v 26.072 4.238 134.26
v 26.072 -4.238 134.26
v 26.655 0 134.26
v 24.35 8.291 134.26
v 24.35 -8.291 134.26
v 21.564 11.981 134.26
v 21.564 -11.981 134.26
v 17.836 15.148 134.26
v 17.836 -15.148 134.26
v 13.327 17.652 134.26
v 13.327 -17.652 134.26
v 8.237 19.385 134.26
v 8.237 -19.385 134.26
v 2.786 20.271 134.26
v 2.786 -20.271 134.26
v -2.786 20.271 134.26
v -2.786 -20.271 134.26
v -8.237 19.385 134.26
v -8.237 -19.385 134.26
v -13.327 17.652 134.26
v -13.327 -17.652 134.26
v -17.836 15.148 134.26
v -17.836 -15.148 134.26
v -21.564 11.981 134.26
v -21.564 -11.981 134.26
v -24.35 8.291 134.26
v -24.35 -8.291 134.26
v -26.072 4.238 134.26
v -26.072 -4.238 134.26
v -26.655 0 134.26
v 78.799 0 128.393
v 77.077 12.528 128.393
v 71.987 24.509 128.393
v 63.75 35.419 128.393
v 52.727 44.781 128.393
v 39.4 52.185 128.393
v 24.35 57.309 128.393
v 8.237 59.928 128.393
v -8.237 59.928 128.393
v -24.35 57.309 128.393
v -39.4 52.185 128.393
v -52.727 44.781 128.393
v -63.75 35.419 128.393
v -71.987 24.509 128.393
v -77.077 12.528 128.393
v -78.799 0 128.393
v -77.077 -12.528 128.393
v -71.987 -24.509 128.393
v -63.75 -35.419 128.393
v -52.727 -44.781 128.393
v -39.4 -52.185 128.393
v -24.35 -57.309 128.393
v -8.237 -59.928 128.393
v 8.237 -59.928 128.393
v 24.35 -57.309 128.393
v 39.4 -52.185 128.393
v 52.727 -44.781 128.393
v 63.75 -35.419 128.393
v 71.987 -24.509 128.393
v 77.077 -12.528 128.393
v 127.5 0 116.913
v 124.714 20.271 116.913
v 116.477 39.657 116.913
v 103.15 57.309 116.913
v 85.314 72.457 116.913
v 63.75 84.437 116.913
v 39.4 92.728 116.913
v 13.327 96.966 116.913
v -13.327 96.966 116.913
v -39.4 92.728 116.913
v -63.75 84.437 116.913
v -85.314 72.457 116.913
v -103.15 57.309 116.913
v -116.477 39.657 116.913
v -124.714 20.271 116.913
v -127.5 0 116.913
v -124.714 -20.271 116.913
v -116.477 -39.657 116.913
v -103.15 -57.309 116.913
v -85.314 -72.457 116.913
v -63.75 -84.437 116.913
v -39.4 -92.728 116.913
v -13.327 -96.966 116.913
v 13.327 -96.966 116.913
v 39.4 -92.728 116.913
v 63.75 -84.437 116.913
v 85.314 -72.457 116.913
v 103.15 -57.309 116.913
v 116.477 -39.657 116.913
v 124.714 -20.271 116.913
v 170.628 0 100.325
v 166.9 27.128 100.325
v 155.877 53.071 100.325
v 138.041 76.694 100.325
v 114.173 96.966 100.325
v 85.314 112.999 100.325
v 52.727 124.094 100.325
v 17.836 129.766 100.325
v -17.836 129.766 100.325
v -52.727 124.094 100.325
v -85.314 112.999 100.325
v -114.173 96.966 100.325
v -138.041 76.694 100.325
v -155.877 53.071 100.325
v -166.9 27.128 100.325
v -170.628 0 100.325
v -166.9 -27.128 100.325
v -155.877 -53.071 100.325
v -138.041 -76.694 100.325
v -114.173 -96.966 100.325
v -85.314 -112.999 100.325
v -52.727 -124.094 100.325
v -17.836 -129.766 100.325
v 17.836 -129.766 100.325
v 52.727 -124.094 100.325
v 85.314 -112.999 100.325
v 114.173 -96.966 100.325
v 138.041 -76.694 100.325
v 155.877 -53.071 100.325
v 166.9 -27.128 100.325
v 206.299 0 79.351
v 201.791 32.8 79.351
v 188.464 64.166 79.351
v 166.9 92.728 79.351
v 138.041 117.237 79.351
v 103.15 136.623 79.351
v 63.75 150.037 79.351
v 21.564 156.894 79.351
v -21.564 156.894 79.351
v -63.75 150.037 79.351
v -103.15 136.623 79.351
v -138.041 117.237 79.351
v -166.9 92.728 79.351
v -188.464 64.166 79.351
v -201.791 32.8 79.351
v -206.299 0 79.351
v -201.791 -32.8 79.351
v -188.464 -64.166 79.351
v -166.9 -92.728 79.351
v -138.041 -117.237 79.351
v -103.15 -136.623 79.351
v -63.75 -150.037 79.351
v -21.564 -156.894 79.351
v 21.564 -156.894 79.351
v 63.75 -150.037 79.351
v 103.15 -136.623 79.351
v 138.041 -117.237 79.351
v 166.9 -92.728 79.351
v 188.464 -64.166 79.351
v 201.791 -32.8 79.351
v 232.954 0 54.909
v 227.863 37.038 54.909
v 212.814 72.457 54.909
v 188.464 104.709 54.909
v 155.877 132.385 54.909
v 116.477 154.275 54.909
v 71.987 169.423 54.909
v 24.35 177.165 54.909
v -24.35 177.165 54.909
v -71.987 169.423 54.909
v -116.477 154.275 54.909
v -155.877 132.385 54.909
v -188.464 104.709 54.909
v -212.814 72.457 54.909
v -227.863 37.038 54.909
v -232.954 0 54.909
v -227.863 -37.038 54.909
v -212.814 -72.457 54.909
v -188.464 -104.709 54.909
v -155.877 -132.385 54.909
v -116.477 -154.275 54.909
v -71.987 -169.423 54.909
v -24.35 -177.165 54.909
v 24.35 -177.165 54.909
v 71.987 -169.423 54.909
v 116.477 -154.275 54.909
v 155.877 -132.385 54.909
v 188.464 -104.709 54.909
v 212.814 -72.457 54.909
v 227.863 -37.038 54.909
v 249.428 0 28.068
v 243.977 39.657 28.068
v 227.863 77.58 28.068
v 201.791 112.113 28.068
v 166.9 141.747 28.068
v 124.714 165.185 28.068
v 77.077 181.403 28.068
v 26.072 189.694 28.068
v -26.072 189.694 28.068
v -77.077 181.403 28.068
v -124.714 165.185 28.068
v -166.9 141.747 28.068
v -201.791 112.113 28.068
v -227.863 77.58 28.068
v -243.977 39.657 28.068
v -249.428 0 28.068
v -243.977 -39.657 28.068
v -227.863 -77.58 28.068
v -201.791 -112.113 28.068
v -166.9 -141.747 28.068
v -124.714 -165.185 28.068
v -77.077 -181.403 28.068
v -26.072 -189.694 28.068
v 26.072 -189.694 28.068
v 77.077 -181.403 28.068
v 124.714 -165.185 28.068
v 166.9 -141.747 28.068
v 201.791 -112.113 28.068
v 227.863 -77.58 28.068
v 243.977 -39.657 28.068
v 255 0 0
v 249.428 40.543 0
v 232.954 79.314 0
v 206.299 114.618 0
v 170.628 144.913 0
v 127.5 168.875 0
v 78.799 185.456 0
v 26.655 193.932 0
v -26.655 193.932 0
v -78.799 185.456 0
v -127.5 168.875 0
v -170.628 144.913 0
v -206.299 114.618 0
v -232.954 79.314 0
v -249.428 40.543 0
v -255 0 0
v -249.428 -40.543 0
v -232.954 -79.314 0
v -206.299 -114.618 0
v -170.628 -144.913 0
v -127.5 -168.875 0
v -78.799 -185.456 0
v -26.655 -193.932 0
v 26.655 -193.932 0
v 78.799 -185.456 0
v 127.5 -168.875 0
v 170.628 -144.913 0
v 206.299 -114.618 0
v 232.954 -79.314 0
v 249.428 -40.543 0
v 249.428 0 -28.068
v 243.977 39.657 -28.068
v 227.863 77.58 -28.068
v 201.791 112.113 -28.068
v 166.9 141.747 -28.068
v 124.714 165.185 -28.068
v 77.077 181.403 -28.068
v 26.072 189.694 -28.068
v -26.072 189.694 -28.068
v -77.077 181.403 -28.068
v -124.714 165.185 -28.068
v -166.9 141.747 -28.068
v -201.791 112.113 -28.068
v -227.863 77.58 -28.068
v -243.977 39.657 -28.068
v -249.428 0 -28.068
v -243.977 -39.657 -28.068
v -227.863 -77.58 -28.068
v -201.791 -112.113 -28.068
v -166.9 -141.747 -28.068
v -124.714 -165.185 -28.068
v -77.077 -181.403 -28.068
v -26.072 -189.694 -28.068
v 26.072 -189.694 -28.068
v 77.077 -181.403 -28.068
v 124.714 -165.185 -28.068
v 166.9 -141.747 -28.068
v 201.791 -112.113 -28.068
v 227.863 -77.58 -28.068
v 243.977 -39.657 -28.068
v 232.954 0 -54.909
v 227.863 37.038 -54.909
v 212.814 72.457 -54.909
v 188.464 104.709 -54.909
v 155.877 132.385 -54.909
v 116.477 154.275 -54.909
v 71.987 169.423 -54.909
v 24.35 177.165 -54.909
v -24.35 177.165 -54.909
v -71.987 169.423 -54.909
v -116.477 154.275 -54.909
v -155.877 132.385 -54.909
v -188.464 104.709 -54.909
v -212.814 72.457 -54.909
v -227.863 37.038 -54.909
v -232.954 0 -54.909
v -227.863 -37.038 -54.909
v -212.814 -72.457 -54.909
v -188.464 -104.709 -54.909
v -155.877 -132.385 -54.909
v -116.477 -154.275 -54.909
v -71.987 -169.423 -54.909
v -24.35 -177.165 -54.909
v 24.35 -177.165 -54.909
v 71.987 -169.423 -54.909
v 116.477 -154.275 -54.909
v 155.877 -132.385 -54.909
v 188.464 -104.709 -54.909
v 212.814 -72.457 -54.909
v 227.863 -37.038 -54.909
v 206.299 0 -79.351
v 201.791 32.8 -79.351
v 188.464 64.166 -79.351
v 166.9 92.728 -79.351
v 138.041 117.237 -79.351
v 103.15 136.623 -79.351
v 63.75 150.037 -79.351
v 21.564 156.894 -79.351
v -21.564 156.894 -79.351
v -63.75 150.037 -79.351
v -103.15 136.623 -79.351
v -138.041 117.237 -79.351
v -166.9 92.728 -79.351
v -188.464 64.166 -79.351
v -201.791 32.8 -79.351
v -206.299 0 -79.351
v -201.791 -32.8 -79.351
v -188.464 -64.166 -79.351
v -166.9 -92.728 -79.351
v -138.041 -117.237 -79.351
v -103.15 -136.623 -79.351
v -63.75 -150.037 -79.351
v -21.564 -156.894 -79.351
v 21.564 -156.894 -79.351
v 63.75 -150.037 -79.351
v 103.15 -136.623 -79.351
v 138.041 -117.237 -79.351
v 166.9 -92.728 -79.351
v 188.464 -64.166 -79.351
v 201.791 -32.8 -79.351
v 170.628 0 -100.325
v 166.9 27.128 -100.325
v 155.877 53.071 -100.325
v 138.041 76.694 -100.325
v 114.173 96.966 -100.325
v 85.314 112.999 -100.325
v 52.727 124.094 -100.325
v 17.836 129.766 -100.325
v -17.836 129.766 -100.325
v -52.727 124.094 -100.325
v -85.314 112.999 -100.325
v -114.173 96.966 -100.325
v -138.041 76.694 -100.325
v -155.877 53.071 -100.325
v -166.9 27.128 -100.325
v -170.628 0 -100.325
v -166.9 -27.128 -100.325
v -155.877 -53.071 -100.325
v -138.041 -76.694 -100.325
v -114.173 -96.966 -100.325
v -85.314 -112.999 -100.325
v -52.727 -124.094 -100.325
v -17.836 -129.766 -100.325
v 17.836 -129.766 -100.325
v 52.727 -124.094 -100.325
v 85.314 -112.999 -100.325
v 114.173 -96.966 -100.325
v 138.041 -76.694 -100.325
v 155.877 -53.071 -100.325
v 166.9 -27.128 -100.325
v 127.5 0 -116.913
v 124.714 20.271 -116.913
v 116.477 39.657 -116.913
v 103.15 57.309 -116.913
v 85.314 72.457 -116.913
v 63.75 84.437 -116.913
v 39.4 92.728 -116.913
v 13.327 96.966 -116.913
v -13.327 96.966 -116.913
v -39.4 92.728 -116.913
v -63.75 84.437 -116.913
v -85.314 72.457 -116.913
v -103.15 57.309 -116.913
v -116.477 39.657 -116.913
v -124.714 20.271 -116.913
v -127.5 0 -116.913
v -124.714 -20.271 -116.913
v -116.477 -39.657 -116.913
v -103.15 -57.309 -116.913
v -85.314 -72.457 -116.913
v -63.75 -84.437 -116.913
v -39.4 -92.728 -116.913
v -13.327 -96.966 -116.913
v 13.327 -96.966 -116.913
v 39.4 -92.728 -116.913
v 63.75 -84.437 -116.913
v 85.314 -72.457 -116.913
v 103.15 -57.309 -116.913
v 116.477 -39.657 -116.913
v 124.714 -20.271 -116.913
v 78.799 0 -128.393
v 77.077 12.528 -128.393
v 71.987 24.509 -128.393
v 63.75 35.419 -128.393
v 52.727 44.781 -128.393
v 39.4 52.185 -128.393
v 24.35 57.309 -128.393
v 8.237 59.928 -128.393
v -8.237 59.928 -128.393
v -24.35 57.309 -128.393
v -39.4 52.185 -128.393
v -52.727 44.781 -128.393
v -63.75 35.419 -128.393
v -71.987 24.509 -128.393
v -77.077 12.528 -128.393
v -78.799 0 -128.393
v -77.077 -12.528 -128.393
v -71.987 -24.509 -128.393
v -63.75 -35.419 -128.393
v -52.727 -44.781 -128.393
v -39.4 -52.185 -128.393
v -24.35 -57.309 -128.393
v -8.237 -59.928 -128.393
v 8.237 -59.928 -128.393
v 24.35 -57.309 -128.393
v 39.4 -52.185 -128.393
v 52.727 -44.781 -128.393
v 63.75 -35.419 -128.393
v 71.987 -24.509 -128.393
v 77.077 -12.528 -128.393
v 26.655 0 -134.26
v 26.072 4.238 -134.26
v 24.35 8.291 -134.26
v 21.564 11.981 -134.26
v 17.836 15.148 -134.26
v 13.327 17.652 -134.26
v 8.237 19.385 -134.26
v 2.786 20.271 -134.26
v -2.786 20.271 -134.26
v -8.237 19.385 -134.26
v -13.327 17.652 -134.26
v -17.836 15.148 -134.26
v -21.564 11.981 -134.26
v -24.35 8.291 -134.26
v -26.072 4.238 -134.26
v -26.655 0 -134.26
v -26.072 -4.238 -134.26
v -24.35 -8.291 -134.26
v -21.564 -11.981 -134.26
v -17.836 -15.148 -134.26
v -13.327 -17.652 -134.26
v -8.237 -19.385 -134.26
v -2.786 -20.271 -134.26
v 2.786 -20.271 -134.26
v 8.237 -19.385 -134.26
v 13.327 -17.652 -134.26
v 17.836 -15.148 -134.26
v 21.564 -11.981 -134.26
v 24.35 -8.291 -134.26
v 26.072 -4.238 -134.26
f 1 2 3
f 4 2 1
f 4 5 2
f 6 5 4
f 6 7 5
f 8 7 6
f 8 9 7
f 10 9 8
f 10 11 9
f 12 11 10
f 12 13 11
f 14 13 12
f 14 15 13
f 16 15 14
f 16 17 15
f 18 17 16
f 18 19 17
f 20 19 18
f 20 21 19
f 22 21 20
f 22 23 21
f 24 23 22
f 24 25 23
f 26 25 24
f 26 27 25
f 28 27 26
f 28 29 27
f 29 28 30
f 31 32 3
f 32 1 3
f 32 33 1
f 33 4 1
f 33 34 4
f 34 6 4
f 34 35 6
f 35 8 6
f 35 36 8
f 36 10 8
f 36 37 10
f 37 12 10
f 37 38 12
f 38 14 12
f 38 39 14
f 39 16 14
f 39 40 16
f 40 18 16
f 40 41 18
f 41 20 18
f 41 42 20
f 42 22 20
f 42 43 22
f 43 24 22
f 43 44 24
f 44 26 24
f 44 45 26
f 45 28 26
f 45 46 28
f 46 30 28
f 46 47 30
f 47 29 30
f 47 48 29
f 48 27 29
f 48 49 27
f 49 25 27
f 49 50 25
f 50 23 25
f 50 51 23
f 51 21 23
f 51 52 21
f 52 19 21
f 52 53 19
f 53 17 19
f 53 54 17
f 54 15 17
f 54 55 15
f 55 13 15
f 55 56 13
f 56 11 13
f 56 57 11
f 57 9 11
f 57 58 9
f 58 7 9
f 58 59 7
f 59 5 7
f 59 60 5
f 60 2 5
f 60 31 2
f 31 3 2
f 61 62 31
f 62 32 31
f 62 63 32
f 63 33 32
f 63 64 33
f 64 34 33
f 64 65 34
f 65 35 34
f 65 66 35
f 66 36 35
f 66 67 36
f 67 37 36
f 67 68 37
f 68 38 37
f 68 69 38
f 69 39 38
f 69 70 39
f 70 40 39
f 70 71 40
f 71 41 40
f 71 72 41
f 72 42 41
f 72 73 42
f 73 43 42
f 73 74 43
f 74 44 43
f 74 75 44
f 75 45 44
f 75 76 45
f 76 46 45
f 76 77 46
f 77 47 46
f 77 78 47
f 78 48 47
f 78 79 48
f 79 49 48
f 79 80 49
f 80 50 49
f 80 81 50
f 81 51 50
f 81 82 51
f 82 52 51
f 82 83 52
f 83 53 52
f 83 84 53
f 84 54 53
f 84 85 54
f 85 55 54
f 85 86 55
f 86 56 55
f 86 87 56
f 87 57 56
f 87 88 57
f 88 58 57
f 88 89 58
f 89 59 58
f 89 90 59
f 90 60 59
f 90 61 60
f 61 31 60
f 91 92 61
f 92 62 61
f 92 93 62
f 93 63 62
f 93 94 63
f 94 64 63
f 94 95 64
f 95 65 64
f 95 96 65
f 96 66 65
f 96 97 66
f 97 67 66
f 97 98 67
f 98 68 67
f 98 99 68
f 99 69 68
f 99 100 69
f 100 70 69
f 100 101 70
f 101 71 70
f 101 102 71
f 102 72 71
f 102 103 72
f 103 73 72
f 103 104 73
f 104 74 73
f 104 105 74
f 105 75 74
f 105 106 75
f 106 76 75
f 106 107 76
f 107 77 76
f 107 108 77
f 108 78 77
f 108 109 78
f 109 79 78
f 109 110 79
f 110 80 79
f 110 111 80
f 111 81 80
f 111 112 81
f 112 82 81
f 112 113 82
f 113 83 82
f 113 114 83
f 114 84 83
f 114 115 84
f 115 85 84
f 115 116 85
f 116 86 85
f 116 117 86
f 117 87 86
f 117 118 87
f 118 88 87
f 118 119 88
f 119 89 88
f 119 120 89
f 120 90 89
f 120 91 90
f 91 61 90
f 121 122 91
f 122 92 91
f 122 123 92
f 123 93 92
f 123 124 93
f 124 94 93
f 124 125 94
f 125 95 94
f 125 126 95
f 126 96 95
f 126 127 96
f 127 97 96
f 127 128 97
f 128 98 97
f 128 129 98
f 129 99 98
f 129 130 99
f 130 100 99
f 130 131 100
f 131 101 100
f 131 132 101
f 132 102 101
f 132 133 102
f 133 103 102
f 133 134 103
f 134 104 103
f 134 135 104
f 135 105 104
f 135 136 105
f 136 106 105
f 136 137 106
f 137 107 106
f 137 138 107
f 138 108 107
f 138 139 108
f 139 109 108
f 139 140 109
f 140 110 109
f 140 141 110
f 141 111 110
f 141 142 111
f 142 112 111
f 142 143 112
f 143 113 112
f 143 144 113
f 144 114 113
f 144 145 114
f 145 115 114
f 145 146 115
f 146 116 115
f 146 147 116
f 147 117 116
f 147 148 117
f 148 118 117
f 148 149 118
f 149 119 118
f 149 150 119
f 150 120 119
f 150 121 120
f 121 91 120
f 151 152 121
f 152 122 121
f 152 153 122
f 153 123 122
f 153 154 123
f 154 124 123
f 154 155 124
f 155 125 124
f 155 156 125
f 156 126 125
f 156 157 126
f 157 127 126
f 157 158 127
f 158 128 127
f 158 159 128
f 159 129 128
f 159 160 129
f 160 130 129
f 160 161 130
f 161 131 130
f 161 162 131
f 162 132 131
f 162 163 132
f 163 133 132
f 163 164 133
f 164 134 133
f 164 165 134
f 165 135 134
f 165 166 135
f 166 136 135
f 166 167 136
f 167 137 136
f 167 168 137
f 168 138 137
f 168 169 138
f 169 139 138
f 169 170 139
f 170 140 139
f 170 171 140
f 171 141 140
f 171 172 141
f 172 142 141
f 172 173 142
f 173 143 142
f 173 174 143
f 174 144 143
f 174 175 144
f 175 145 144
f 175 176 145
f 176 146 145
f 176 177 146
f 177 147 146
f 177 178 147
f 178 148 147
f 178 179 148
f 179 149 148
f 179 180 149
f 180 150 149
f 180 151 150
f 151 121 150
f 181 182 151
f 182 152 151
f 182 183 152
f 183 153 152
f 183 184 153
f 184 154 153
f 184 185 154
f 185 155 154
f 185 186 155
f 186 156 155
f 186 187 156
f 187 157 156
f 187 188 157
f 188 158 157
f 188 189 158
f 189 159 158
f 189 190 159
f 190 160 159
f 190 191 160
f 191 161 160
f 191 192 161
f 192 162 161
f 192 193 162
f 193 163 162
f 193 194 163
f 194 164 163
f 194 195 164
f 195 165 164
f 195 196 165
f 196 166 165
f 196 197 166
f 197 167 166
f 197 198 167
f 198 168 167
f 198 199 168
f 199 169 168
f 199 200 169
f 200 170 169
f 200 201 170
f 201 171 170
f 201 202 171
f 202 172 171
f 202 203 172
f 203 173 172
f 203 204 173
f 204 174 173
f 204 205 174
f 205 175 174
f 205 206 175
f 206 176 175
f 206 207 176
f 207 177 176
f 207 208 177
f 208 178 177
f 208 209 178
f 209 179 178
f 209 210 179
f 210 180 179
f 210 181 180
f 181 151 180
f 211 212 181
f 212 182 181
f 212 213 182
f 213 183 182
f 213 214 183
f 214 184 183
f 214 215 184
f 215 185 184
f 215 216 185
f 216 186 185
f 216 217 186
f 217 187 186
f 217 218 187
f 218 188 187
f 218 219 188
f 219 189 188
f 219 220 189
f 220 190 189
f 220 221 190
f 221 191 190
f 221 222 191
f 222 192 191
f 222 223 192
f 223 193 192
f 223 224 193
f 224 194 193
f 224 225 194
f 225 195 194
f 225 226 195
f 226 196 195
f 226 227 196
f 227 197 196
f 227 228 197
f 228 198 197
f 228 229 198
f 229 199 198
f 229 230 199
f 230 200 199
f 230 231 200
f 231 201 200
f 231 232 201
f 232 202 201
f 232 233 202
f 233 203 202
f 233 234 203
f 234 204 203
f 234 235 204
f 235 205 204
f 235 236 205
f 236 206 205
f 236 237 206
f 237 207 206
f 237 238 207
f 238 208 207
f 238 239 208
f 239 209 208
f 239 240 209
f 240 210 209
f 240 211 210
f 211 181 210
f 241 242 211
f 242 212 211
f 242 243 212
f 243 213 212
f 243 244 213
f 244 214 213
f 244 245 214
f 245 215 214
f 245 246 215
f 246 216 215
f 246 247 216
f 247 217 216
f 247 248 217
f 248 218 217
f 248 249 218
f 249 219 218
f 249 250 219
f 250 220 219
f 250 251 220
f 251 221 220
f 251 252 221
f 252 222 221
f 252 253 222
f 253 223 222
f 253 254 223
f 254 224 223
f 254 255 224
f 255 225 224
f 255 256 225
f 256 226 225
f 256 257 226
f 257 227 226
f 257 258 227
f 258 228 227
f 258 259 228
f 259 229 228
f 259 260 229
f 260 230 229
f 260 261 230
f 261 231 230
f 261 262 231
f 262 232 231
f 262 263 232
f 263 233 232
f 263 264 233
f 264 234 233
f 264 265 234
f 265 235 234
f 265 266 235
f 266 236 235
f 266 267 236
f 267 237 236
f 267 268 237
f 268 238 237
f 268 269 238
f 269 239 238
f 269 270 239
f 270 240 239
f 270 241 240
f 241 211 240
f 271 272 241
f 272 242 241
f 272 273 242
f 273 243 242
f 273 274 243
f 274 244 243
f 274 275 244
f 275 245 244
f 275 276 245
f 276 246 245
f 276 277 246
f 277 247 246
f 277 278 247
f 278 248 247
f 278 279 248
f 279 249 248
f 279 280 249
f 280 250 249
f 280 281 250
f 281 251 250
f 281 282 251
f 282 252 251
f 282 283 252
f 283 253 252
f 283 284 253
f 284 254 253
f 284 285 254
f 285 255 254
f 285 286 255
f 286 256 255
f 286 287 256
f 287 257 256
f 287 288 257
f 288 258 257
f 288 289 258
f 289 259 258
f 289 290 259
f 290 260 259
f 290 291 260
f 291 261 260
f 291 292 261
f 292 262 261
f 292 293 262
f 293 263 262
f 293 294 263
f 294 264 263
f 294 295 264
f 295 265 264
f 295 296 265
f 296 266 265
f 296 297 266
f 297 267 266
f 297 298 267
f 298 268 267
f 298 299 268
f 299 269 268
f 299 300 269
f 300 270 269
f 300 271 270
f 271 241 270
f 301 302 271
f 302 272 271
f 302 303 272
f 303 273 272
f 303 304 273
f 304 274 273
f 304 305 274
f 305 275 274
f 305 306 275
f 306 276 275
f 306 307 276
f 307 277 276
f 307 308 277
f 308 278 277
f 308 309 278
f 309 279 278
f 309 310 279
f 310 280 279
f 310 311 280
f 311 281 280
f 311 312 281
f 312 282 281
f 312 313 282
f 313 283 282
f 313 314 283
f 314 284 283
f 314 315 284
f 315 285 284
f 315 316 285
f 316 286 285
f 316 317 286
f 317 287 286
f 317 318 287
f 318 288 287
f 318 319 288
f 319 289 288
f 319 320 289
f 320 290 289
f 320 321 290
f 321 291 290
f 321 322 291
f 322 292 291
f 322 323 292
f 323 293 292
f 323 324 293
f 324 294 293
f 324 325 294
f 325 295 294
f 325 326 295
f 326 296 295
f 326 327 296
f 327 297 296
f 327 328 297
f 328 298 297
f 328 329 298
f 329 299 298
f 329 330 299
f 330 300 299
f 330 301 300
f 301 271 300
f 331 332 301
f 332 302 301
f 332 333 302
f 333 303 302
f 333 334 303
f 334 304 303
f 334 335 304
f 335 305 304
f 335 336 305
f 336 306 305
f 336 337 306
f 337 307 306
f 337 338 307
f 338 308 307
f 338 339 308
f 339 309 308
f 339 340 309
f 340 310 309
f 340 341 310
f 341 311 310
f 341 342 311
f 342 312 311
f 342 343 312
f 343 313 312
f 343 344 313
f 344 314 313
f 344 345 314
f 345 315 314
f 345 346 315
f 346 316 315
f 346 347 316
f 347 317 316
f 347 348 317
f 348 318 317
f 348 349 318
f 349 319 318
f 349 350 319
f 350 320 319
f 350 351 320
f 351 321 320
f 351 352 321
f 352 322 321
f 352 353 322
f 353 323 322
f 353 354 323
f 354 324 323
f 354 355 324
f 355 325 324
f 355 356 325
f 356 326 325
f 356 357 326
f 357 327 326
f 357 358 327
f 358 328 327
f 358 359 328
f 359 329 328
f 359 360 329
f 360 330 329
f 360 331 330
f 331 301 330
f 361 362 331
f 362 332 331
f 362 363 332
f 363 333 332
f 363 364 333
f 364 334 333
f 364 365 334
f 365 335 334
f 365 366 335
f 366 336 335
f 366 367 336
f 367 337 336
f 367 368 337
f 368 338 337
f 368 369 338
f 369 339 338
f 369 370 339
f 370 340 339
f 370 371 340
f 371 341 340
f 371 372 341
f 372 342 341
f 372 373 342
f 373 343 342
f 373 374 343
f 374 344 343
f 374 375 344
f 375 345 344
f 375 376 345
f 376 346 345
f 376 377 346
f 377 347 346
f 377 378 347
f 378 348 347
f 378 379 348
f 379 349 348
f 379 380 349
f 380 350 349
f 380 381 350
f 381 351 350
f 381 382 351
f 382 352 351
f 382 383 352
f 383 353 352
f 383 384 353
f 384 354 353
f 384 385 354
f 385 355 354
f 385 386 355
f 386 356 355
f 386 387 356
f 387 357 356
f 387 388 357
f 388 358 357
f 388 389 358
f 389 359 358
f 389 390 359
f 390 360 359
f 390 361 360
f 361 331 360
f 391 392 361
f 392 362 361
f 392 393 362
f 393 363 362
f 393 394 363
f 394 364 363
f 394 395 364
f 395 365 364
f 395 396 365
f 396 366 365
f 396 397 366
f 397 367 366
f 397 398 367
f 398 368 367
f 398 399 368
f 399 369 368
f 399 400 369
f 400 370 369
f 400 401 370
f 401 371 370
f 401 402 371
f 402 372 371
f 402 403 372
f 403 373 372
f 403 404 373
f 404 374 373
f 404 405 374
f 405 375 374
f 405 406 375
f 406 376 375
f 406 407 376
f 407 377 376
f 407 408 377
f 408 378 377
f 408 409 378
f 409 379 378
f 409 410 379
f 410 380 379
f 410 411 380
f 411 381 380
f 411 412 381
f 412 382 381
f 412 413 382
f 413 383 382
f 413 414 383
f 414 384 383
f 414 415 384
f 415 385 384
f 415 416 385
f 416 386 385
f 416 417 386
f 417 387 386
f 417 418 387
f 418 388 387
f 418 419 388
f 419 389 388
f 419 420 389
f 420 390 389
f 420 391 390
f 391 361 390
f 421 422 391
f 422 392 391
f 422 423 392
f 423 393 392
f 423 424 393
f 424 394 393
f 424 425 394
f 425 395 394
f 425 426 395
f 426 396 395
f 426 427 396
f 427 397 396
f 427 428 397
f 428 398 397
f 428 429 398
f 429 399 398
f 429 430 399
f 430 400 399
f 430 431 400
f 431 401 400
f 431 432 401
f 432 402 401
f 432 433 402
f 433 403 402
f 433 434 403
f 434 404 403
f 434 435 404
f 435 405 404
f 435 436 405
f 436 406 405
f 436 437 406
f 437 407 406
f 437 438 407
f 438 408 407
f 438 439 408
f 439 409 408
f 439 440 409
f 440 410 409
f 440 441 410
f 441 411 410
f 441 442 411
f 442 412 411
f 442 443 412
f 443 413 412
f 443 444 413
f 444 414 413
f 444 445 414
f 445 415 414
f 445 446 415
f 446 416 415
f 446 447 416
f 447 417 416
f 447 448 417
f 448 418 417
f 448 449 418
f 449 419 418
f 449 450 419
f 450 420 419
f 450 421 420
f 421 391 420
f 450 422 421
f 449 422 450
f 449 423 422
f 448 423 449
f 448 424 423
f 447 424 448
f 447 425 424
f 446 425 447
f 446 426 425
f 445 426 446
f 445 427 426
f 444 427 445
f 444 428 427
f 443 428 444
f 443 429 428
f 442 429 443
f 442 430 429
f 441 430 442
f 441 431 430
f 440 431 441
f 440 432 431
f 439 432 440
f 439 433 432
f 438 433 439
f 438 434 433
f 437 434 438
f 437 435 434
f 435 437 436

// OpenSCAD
// Generated by SolidPython 1.0.1 on 2020-07-29 00:46:53


scale(v = [17, 13, 9]) {
	sphere(r = 15);
}
/***********************************************
*********      SolidPython code:      **********
************************************************
 
# import packages: SolidPython
from solid import *
from solid.utils import *
from itertools import chain, combinations, permutations


class Resize:

    def __init__(self, scad_file):
        self.scad_file = scad_file
        #self.scad_file = import_scad(scad_file)
        # cone/cylinder param:
        self.r1 = 0
        self.r2 = 0
        self.h = 0
        # rectangular prism param:
        self.w = 0
        self.l = 0
        # ellipse param:
        self.r = 0

    # import OpenScad code (file name corresponds to shape)


    # classify shape + parameters
    def assign(self, param1, param2, param3):
        if self.scad_file == 'cone.scad':
            self.r1 = param1
            self.r2 = param2
            self.h = param3
        elif self.scad_file == 'cylinder.scad':
            self.r1 = param1
            self.r2 = param2
            self.h = param3
        elif self.scad_file == 'rectangularPrism.scad':
            self.h = param1
            self.l = param2
            self.w = param3
        else:
            self.r = param1
            self.h = param2

    # resize parameters
    def iterate(self):
        x = range(3, 20, 2)
        i = 1
        if self.scad_file == 'cone.scad':
            tempList = list(permutations(x, 2))
            for temp in tempList:
                param1 = temp[0]
                param2 = temp[1]
                filepath = 'produced_scad_files/' + 'cone' + str(param1) + '_' + str(param2) + '_' + '.scad'
                scad_render_to_file(cylinder(h=param1, r1=param2, r2=0), filepath)

        elif self.scad_file == 'cylinder.scad':
            tempList = list(permutations(x, 3))
            for temp in tempList:
                param1 = temp[0]
                param2 = temp[1]
                filepath = 'produced_scad_files/' + 'cylinder' + str(param1) + '_' + str(param2) + '_' + '.scad'
                scad_render_to_file(cylinder(h=param1, r1=param2, r2=param2), filepath)

        elif self.scad_file == 'rectangularPrism.scad':
            tempList = list(permutations(x, 3))
            for temp in tempList:
                param1 = temp[0]
                param2 = temp[1]
                param3 = temp[2]
                filepath = 'produced_scad_files/' + 'rectangularPrism' + str(param1) + '_' + str(param2) + '_' + str(
                    param3) + '.scad'
                scad_render_to_file(cube(size=(param1, param2, param3)), filepath)

        elif self.scad_file == 'ellipse.scad':
            tempList = list(permutations(x, 4))
            for temp in tempList:
                param1 = temp[0]
                param2 = temp[1]
                param3 = temp[2]
                param4 = temp[3]
                filepath = 'produced_scad_files/' + 'ellipse' + str(param1) + '_' + str(param2) + '_' + str(param3) + '_' + str(param4) + '.scad'
                scad_render_to_file(scale([param1, param2, param3])(sphere(r=param4)), filepath)

    def render_to_scadfile(self):
        scad_render_to_file(scad, 'example.scad') 
 
************************************************/
